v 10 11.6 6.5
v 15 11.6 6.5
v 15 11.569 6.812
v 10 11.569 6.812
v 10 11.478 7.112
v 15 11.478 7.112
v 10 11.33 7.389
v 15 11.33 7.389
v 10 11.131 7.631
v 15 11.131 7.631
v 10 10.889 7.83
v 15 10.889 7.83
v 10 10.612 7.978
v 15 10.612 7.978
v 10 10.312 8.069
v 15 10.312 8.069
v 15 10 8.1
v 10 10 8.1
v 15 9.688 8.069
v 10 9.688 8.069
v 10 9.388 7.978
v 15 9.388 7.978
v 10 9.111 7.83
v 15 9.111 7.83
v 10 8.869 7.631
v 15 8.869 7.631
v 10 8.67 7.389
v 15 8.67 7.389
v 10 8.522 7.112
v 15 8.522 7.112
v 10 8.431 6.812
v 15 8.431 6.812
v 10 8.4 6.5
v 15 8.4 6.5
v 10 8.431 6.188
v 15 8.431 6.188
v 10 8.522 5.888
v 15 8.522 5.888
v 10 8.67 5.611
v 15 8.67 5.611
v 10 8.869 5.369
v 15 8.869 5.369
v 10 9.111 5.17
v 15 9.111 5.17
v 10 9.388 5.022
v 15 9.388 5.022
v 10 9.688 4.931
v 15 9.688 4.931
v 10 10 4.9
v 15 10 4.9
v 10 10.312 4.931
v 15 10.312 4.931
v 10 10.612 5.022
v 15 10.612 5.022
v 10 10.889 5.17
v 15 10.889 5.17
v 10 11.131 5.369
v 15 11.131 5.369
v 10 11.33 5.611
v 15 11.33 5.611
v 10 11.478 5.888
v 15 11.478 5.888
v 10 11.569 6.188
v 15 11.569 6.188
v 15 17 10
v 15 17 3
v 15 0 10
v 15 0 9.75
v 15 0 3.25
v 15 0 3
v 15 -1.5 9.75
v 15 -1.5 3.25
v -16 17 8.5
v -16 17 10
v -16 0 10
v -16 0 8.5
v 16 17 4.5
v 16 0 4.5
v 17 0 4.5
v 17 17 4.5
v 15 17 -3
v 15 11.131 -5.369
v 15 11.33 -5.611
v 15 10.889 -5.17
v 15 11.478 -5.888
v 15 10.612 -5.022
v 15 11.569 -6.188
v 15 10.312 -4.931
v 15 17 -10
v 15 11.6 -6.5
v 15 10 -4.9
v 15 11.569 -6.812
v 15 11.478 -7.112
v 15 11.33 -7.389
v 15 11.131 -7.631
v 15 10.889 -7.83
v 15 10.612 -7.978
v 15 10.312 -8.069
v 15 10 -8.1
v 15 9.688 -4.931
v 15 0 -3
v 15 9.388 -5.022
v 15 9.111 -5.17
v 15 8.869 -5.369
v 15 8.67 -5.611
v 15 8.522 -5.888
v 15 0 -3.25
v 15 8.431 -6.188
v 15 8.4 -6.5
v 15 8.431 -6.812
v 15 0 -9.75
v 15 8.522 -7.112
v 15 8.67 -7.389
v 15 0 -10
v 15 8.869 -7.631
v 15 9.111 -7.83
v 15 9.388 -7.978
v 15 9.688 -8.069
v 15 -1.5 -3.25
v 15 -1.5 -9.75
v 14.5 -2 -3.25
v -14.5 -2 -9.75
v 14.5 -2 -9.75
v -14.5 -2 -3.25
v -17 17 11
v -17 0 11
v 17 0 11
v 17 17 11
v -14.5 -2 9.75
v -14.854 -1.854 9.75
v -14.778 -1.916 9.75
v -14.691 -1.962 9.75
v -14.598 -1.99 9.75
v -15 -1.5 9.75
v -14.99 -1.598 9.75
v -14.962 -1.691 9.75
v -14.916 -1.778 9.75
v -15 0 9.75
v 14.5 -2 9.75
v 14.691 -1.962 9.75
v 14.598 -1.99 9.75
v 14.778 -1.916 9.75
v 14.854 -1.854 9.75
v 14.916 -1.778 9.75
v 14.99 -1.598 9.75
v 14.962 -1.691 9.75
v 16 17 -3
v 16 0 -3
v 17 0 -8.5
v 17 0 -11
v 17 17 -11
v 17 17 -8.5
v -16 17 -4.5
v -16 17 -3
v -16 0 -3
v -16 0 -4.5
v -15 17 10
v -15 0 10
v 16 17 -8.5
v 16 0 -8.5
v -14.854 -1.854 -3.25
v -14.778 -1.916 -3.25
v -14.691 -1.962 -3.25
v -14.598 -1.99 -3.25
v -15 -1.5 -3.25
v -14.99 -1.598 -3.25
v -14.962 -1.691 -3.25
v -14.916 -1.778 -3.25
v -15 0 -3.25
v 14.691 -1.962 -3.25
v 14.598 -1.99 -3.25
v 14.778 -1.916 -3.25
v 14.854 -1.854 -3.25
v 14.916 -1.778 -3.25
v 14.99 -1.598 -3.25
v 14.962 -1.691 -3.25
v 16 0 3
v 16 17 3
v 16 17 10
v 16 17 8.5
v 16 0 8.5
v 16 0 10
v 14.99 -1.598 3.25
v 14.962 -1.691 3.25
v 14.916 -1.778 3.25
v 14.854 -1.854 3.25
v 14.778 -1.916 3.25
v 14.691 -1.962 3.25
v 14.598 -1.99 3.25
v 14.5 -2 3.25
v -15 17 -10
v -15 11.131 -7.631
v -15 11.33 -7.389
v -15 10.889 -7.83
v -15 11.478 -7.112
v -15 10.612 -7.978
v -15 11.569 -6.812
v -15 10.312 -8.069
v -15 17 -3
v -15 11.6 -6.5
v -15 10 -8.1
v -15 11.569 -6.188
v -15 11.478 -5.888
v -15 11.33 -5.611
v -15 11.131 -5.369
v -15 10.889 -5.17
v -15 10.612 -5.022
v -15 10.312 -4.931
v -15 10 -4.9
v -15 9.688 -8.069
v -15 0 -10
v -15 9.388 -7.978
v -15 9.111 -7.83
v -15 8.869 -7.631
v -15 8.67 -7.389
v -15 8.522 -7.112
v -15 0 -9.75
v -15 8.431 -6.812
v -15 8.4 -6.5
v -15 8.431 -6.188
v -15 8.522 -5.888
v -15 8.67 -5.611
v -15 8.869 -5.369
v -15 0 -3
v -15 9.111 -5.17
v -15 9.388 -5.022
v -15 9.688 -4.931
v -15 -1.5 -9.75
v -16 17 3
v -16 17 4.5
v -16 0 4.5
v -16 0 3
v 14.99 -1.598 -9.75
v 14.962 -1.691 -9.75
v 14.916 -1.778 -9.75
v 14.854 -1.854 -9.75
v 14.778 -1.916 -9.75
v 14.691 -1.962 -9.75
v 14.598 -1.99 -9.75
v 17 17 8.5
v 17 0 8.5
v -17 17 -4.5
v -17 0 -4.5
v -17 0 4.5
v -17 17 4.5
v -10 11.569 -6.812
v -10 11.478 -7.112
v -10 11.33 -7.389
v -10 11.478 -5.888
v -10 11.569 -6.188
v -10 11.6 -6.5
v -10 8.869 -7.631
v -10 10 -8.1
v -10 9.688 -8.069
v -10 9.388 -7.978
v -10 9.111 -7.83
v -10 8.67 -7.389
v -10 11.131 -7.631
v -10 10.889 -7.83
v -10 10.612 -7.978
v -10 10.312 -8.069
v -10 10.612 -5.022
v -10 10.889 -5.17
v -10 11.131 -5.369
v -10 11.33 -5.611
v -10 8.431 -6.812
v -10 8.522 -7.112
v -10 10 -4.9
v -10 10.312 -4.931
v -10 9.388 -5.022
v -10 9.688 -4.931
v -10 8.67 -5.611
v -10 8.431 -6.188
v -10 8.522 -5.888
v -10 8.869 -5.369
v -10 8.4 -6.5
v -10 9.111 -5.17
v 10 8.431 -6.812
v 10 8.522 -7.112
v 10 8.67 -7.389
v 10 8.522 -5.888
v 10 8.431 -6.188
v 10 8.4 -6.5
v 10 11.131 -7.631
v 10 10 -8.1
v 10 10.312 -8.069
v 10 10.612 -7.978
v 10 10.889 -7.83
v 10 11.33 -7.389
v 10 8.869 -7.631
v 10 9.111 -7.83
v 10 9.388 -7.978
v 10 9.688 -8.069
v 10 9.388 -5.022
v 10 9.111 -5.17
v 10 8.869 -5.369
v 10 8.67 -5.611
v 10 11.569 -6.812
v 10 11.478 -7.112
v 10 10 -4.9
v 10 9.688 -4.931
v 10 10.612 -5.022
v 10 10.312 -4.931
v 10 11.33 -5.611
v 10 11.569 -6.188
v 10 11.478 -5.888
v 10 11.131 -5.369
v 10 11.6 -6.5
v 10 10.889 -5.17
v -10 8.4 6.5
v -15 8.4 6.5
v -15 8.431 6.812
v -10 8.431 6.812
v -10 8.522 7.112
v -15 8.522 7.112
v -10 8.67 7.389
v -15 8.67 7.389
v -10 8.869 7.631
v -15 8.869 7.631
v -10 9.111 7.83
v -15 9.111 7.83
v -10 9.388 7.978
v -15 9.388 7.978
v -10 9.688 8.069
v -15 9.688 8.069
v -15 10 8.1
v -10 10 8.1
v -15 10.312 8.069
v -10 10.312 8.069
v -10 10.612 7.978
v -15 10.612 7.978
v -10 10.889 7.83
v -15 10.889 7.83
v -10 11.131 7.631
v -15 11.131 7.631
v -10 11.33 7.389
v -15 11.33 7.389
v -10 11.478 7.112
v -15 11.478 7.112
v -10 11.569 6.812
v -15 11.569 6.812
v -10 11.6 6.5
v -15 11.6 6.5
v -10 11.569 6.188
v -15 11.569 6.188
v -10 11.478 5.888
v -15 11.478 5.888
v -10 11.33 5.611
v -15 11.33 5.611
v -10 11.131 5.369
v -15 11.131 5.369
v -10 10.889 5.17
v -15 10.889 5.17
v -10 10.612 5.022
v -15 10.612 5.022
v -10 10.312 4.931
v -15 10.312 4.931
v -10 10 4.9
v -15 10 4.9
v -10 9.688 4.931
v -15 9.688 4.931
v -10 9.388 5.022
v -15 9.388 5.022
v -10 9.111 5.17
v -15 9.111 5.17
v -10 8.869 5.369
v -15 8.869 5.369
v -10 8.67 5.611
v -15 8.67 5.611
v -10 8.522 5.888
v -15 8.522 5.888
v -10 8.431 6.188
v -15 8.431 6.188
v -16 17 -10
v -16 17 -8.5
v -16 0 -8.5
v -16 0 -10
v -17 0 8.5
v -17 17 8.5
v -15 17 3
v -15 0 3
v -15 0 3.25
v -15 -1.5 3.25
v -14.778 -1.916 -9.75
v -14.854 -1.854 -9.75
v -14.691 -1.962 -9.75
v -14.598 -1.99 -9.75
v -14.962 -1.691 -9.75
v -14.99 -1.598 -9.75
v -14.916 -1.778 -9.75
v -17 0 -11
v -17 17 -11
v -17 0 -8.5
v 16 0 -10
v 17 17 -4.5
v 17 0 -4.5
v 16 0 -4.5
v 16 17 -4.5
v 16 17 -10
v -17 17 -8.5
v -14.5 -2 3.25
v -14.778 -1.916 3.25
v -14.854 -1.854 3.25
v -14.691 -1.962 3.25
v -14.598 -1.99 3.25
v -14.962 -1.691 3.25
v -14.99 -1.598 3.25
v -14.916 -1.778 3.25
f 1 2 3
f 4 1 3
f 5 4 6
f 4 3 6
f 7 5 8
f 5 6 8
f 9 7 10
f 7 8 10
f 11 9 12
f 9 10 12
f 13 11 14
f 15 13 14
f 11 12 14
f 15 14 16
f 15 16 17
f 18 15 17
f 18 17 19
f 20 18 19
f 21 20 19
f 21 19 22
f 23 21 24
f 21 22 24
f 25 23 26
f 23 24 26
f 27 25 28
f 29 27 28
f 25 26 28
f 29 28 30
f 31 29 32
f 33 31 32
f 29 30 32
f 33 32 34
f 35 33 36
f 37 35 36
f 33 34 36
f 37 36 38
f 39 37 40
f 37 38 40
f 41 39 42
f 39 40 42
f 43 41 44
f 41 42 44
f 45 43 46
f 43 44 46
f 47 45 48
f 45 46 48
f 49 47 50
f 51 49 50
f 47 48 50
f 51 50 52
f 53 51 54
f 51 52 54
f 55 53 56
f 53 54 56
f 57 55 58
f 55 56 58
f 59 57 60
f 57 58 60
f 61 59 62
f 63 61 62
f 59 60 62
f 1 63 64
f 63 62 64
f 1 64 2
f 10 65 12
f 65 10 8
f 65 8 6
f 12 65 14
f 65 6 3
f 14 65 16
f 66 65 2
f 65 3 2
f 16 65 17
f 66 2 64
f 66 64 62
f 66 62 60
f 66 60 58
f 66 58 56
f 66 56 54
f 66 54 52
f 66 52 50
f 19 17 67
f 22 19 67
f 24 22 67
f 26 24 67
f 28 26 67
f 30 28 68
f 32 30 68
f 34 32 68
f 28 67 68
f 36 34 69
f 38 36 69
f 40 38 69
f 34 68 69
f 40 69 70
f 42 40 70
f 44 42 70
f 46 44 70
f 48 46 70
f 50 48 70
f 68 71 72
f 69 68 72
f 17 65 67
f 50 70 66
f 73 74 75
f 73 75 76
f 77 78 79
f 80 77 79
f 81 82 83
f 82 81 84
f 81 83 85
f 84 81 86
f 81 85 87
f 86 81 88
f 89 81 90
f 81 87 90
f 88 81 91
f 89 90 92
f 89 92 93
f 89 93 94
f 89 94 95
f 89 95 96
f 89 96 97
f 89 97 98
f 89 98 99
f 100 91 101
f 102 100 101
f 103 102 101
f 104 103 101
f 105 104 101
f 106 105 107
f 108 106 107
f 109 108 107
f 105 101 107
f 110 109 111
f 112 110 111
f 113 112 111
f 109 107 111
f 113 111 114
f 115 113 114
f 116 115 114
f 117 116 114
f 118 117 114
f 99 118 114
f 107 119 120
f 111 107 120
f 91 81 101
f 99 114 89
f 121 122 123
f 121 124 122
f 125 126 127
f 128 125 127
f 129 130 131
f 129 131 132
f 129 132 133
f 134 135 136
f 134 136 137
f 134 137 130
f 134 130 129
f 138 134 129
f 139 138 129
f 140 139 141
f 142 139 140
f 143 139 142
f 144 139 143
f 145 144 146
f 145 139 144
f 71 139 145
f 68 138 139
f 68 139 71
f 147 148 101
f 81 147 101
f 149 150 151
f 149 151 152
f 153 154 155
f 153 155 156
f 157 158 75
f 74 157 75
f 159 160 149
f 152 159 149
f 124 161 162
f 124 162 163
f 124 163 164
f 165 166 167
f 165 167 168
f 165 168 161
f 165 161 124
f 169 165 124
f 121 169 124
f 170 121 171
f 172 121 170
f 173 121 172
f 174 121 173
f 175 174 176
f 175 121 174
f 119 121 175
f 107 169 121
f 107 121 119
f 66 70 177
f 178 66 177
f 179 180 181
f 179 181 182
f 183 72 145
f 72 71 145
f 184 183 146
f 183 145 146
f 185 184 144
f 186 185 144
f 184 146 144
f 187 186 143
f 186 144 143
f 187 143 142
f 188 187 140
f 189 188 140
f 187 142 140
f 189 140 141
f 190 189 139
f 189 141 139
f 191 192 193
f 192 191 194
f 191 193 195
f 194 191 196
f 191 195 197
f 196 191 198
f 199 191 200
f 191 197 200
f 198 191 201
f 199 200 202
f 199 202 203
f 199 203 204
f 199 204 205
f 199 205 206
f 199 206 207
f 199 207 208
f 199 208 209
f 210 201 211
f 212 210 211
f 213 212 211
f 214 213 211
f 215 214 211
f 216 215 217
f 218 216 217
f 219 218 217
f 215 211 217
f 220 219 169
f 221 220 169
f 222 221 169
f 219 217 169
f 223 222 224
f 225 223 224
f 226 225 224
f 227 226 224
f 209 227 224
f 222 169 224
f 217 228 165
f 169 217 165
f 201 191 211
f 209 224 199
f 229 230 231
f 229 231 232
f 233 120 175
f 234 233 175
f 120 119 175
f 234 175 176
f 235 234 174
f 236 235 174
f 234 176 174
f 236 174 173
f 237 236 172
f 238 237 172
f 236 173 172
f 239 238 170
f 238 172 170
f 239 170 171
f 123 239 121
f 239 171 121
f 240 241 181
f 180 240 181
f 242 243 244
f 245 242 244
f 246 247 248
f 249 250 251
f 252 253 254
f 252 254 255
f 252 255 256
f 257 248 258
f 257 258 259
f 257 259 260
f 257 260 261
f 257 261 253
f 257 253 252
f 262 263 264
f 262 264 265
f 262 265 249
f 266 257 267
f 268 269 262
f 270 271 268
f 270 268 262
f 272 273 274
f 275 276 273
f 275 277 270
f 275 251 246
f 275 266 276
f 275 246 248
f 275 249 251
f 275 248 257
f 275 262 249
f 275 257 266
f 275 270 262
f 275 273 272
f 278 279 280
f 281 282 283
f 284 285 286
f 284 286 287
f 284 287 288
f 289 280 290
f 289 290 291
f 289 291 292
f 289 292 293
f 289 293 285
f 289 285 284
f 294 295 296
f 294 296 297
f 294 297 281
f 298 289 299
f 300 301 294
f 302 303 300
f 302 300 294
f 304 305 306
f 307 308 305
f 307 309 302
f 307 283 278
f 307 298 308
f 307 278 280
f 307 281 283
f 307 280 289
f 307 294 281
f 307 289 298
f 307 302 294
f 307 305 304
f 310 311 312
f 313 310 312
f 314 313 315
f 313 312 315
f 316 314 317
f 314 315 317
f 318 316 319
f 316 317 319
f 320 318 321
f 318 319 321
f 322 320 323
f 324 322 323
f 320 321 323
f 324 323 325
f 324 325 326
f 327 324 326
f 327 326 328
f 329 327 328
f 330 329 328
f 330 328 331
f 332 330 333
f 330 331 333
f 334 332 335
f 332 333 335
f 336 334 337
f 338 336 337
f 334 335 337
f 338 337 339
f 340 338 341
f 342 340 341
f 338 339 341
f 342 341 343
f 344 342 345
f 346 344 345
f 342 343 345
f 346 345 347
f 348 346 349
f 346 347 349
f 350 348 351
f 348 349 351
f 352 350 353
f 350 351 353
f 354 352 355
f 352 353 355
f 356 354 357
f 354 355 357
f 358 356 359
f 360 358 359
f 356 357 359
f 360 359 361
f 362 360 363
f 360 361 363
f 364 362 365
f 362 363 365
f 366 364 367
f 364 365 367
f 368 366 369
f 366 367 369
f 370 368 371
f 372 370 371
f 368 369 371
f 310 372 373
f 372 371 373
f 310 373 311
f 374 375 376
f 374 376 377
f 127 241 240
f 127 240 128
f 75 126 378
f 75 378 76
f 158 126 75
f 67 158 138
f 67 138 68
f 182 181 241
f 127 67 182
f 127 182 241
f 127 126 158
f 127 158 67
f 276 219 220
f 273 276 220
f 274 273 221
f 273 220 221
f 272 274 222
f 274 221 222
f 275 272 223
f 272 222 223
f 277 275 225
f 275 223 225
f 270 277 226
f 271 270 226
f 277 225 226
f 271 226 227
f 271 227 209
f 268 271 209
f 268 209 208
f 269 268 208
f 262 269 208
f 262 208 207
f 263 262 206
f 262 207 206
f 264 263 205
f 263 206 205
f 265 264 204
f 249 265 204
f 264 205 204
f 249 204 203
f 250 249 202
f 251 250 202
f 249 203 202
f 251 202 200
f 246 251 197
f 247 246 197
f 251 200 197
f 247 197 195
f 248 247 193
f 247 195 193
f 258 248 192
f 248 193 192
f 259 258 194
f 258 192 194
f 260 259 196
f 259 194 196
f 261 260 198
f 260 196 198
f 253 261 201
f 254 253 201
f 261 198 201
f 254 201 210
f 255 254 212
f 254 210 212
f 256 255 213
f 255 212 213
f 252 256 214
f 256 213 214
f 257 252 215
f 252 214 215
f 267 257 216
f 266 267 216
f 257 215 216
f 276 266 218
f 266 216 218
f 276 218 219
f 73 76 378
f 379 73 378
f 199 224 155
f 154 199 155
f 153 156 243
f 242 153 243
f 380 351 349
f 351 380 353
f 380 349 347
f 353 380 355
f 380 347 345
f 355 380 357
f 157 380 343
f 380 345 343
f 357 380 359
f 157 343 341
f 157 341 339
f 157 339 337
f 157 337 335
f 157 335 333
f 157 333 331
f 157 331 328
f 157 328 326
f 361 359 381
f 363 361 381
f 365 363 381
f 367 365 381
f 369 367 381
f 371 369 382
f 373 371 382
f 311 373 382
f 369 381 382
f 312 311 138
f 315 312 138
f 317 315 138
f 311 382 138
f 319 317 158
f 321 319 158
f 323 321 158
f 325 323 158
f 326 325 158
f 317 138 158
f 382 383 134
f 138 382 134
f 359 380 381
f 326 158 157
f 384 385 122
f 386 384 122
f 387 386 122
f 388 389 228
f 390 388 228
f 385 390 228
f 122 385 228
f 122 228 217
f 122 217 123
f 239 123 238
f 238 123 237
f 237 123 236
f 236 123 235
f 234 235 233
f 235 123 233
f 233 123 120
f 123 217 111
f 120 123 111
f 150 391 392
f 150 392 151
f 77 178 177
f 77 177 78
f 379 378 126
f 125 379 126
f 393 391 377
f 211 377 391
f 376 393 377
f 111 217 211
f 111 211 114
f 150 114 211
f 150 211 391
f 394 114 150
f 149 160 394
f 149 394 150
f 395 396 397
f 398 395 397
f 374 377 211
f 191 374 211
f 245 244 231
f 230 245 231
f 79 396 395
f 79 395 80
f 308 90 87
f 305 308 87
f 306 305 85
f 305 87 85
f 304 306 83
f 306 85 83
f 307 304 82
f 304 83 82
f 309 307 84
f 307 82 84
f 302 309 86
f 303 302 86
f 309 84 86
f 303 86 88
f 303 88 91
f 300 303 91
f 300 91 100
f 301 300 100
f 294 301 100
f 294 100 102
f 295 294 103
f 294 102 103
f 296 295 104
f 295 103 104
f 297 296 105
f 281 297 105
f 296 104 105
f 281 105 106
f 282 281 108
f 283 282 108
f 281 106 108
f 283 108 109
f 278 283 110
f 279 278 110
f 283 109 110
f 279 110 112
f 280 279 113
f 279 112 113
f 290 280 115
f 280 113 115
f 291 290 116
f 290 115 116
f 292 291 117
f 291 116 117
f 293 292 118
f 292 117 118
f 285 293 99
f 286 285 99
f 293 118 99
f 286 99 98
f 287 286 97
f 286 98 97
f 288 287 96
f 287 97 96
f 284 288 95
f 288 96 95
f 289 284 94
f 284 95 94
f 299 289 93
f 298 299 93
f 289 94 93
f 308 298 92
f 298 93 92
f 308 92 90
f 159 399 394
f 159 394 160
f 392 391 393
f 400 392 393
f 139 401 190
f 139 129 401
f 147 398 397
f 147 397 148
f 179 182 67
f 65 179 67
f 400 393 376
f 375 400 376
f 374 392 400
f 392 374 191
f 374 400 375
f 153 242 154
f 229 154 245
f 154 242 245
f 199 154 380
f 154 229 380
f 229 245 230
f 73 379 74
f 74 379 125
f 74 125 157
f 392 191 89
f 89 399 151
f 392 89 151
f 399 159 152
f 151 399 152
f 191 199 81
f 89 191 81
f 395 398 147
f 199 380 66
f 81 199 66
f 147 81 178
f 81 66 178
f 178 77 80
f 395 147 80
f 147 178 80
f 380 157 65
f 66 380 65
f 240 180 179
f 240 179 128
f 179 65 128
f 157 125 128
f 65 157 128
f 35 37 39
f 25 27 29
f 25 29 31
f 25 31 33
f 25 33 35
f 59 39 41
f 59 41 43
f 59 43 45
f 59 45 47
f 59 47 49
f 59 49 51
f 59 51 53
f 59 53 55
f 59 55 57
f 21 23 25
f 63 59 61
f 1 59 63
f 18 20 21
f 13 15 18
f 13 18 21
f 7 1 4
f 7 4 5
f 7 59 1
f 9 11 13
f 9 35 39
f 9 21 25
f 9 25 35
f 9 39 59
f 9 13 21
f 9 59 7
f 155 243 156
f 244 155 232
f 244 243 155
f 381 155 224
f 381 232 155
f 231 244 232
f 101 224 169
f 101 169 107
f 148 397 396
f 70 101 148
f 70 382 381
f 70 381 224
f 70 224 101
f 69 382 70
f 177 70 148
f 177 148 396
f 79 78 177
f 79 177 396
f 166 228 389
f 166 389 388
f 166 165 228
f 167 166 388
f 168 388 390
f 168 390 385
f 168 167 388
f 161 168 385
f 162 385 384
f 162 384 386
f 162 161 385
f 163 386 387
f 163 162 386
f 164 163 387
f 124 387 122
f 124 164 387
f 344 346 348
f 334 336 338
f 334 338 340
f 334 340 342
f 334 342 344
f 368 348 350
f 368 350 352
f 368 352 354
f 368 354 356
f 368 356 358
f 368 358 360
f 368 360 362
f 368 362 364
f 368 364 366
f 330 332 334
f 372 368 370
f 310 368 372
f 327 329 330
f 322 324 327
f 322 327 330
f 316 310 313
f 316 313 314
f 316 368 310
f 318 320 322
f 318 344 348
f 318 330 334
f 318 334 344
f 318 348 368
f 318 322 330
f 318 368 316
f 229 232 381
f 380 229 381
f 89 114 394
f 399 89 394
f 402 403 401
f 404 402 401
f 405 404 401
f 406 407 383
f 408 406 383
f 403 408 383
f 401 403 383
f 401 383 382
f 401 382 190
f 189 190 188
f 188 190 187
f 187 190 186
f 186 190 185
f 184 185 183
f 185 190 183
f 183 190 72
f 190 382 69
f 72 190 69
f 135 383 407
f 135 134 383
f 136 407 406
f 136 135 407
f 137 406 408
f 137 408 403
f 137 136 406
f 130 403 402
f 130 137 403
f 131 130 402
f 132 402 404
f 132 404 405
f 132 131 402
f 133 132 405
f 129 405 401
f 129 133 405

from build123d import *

# Parameters (mm, degrees)
F0_W      = 34
F0_H      = 22
F1_DEPTH  = 17
F3_DEPTH  = 17.001
F4_W      = 30
F4_H      = 6.5
F5_DEPTH  = 2
F7_R      = 1.6
F8_DEPTH  = 5
F10_R     = 1.6
F11_DEPTH = 5
F12_R     = 0.5


with BuildPart() as f1:
    # F0 (on Front) → F1 (new body)
    with BuildSketch(Plane.XZ):
        Rectangle(F0_W, F0_H)
    extrude(amount=-F1_DEPTH)

    # F2 (on face) → F3 (cut, through all)
    with BuildSketch(Plane.XZ):
        Polygon((-16, 8.5), (-17, 8.5), (-17, 4.5), (-16, 4.5), (-16, 3), (-15, 3), (-15, 10), (-16, 10), align=None)
        Polygon((15, 10), (15, 3), (16, 3), (16, 4.5), (17, 4.5), (17, 8.5), (16, 8.5), (16, 10), align=None)
        Polygon((17, -4.5), (16, -4.5), (16, -3), (15, -3), (15, -10), (16, -10), (16, -8.5), (17, -8.5), align=None)
        Polygon((-17, -4.5), (-17, -8.5), (-16, -8.5), (-16, -10), (-15, -10), (-15, -3), (-16, -3), (-16, -4.5), align=None)
    extrude(amount=-F3_DEPTH, mode=Mode.SUBTRACT)

    # F4 (on face) → F5 (join)
    with BuildSketch(Plane.XZ):
        with Locations((0, 6.5)):
            Rectangle(F4_W, F4_H)
        with Locations((0, -6.5)):
            Rectangle(F4_W, F4_H)
    extrude(amount=F5_DEPTH)

    # F7 (on offset) → F8 (cut)
    with BuildSketch(Plane(origin=(-15, 0, 0), x_dir=(0, -1, 0), z_dir=(-1, 0, 0))):
        with Locations((-10, 6.5)):
            Circle(F7_R)
        with Locations((-10, -6.5)):
            Circle(F7_R)
    extrude(amount=-F8_DEPTH, mode=Mode.SUBTRACT)

    # F10 (on offset) → F11 (cut)
    with BuildSketch(Plane.YZ.offset(15)):
        with Locations((10, 6.5)):
            Circle(F10_R)
        with Locations((10, -6.5)):
            Circle(F10_R)
    extrude(amount=-F11_DEPTH, mode=Mode.SUBTRACT)

    # F12
    f12_edges = [f1.edges().sort_by_distance(p)[0] for p in [
        (15, -2, 6.5),
        (-15, -2, 6.5),
        (15, -2, -6.5),
        (-15, -2, -6.5),
    ]]
    fillet(f12_edges, radius=F12_R)


solid = f1.part
